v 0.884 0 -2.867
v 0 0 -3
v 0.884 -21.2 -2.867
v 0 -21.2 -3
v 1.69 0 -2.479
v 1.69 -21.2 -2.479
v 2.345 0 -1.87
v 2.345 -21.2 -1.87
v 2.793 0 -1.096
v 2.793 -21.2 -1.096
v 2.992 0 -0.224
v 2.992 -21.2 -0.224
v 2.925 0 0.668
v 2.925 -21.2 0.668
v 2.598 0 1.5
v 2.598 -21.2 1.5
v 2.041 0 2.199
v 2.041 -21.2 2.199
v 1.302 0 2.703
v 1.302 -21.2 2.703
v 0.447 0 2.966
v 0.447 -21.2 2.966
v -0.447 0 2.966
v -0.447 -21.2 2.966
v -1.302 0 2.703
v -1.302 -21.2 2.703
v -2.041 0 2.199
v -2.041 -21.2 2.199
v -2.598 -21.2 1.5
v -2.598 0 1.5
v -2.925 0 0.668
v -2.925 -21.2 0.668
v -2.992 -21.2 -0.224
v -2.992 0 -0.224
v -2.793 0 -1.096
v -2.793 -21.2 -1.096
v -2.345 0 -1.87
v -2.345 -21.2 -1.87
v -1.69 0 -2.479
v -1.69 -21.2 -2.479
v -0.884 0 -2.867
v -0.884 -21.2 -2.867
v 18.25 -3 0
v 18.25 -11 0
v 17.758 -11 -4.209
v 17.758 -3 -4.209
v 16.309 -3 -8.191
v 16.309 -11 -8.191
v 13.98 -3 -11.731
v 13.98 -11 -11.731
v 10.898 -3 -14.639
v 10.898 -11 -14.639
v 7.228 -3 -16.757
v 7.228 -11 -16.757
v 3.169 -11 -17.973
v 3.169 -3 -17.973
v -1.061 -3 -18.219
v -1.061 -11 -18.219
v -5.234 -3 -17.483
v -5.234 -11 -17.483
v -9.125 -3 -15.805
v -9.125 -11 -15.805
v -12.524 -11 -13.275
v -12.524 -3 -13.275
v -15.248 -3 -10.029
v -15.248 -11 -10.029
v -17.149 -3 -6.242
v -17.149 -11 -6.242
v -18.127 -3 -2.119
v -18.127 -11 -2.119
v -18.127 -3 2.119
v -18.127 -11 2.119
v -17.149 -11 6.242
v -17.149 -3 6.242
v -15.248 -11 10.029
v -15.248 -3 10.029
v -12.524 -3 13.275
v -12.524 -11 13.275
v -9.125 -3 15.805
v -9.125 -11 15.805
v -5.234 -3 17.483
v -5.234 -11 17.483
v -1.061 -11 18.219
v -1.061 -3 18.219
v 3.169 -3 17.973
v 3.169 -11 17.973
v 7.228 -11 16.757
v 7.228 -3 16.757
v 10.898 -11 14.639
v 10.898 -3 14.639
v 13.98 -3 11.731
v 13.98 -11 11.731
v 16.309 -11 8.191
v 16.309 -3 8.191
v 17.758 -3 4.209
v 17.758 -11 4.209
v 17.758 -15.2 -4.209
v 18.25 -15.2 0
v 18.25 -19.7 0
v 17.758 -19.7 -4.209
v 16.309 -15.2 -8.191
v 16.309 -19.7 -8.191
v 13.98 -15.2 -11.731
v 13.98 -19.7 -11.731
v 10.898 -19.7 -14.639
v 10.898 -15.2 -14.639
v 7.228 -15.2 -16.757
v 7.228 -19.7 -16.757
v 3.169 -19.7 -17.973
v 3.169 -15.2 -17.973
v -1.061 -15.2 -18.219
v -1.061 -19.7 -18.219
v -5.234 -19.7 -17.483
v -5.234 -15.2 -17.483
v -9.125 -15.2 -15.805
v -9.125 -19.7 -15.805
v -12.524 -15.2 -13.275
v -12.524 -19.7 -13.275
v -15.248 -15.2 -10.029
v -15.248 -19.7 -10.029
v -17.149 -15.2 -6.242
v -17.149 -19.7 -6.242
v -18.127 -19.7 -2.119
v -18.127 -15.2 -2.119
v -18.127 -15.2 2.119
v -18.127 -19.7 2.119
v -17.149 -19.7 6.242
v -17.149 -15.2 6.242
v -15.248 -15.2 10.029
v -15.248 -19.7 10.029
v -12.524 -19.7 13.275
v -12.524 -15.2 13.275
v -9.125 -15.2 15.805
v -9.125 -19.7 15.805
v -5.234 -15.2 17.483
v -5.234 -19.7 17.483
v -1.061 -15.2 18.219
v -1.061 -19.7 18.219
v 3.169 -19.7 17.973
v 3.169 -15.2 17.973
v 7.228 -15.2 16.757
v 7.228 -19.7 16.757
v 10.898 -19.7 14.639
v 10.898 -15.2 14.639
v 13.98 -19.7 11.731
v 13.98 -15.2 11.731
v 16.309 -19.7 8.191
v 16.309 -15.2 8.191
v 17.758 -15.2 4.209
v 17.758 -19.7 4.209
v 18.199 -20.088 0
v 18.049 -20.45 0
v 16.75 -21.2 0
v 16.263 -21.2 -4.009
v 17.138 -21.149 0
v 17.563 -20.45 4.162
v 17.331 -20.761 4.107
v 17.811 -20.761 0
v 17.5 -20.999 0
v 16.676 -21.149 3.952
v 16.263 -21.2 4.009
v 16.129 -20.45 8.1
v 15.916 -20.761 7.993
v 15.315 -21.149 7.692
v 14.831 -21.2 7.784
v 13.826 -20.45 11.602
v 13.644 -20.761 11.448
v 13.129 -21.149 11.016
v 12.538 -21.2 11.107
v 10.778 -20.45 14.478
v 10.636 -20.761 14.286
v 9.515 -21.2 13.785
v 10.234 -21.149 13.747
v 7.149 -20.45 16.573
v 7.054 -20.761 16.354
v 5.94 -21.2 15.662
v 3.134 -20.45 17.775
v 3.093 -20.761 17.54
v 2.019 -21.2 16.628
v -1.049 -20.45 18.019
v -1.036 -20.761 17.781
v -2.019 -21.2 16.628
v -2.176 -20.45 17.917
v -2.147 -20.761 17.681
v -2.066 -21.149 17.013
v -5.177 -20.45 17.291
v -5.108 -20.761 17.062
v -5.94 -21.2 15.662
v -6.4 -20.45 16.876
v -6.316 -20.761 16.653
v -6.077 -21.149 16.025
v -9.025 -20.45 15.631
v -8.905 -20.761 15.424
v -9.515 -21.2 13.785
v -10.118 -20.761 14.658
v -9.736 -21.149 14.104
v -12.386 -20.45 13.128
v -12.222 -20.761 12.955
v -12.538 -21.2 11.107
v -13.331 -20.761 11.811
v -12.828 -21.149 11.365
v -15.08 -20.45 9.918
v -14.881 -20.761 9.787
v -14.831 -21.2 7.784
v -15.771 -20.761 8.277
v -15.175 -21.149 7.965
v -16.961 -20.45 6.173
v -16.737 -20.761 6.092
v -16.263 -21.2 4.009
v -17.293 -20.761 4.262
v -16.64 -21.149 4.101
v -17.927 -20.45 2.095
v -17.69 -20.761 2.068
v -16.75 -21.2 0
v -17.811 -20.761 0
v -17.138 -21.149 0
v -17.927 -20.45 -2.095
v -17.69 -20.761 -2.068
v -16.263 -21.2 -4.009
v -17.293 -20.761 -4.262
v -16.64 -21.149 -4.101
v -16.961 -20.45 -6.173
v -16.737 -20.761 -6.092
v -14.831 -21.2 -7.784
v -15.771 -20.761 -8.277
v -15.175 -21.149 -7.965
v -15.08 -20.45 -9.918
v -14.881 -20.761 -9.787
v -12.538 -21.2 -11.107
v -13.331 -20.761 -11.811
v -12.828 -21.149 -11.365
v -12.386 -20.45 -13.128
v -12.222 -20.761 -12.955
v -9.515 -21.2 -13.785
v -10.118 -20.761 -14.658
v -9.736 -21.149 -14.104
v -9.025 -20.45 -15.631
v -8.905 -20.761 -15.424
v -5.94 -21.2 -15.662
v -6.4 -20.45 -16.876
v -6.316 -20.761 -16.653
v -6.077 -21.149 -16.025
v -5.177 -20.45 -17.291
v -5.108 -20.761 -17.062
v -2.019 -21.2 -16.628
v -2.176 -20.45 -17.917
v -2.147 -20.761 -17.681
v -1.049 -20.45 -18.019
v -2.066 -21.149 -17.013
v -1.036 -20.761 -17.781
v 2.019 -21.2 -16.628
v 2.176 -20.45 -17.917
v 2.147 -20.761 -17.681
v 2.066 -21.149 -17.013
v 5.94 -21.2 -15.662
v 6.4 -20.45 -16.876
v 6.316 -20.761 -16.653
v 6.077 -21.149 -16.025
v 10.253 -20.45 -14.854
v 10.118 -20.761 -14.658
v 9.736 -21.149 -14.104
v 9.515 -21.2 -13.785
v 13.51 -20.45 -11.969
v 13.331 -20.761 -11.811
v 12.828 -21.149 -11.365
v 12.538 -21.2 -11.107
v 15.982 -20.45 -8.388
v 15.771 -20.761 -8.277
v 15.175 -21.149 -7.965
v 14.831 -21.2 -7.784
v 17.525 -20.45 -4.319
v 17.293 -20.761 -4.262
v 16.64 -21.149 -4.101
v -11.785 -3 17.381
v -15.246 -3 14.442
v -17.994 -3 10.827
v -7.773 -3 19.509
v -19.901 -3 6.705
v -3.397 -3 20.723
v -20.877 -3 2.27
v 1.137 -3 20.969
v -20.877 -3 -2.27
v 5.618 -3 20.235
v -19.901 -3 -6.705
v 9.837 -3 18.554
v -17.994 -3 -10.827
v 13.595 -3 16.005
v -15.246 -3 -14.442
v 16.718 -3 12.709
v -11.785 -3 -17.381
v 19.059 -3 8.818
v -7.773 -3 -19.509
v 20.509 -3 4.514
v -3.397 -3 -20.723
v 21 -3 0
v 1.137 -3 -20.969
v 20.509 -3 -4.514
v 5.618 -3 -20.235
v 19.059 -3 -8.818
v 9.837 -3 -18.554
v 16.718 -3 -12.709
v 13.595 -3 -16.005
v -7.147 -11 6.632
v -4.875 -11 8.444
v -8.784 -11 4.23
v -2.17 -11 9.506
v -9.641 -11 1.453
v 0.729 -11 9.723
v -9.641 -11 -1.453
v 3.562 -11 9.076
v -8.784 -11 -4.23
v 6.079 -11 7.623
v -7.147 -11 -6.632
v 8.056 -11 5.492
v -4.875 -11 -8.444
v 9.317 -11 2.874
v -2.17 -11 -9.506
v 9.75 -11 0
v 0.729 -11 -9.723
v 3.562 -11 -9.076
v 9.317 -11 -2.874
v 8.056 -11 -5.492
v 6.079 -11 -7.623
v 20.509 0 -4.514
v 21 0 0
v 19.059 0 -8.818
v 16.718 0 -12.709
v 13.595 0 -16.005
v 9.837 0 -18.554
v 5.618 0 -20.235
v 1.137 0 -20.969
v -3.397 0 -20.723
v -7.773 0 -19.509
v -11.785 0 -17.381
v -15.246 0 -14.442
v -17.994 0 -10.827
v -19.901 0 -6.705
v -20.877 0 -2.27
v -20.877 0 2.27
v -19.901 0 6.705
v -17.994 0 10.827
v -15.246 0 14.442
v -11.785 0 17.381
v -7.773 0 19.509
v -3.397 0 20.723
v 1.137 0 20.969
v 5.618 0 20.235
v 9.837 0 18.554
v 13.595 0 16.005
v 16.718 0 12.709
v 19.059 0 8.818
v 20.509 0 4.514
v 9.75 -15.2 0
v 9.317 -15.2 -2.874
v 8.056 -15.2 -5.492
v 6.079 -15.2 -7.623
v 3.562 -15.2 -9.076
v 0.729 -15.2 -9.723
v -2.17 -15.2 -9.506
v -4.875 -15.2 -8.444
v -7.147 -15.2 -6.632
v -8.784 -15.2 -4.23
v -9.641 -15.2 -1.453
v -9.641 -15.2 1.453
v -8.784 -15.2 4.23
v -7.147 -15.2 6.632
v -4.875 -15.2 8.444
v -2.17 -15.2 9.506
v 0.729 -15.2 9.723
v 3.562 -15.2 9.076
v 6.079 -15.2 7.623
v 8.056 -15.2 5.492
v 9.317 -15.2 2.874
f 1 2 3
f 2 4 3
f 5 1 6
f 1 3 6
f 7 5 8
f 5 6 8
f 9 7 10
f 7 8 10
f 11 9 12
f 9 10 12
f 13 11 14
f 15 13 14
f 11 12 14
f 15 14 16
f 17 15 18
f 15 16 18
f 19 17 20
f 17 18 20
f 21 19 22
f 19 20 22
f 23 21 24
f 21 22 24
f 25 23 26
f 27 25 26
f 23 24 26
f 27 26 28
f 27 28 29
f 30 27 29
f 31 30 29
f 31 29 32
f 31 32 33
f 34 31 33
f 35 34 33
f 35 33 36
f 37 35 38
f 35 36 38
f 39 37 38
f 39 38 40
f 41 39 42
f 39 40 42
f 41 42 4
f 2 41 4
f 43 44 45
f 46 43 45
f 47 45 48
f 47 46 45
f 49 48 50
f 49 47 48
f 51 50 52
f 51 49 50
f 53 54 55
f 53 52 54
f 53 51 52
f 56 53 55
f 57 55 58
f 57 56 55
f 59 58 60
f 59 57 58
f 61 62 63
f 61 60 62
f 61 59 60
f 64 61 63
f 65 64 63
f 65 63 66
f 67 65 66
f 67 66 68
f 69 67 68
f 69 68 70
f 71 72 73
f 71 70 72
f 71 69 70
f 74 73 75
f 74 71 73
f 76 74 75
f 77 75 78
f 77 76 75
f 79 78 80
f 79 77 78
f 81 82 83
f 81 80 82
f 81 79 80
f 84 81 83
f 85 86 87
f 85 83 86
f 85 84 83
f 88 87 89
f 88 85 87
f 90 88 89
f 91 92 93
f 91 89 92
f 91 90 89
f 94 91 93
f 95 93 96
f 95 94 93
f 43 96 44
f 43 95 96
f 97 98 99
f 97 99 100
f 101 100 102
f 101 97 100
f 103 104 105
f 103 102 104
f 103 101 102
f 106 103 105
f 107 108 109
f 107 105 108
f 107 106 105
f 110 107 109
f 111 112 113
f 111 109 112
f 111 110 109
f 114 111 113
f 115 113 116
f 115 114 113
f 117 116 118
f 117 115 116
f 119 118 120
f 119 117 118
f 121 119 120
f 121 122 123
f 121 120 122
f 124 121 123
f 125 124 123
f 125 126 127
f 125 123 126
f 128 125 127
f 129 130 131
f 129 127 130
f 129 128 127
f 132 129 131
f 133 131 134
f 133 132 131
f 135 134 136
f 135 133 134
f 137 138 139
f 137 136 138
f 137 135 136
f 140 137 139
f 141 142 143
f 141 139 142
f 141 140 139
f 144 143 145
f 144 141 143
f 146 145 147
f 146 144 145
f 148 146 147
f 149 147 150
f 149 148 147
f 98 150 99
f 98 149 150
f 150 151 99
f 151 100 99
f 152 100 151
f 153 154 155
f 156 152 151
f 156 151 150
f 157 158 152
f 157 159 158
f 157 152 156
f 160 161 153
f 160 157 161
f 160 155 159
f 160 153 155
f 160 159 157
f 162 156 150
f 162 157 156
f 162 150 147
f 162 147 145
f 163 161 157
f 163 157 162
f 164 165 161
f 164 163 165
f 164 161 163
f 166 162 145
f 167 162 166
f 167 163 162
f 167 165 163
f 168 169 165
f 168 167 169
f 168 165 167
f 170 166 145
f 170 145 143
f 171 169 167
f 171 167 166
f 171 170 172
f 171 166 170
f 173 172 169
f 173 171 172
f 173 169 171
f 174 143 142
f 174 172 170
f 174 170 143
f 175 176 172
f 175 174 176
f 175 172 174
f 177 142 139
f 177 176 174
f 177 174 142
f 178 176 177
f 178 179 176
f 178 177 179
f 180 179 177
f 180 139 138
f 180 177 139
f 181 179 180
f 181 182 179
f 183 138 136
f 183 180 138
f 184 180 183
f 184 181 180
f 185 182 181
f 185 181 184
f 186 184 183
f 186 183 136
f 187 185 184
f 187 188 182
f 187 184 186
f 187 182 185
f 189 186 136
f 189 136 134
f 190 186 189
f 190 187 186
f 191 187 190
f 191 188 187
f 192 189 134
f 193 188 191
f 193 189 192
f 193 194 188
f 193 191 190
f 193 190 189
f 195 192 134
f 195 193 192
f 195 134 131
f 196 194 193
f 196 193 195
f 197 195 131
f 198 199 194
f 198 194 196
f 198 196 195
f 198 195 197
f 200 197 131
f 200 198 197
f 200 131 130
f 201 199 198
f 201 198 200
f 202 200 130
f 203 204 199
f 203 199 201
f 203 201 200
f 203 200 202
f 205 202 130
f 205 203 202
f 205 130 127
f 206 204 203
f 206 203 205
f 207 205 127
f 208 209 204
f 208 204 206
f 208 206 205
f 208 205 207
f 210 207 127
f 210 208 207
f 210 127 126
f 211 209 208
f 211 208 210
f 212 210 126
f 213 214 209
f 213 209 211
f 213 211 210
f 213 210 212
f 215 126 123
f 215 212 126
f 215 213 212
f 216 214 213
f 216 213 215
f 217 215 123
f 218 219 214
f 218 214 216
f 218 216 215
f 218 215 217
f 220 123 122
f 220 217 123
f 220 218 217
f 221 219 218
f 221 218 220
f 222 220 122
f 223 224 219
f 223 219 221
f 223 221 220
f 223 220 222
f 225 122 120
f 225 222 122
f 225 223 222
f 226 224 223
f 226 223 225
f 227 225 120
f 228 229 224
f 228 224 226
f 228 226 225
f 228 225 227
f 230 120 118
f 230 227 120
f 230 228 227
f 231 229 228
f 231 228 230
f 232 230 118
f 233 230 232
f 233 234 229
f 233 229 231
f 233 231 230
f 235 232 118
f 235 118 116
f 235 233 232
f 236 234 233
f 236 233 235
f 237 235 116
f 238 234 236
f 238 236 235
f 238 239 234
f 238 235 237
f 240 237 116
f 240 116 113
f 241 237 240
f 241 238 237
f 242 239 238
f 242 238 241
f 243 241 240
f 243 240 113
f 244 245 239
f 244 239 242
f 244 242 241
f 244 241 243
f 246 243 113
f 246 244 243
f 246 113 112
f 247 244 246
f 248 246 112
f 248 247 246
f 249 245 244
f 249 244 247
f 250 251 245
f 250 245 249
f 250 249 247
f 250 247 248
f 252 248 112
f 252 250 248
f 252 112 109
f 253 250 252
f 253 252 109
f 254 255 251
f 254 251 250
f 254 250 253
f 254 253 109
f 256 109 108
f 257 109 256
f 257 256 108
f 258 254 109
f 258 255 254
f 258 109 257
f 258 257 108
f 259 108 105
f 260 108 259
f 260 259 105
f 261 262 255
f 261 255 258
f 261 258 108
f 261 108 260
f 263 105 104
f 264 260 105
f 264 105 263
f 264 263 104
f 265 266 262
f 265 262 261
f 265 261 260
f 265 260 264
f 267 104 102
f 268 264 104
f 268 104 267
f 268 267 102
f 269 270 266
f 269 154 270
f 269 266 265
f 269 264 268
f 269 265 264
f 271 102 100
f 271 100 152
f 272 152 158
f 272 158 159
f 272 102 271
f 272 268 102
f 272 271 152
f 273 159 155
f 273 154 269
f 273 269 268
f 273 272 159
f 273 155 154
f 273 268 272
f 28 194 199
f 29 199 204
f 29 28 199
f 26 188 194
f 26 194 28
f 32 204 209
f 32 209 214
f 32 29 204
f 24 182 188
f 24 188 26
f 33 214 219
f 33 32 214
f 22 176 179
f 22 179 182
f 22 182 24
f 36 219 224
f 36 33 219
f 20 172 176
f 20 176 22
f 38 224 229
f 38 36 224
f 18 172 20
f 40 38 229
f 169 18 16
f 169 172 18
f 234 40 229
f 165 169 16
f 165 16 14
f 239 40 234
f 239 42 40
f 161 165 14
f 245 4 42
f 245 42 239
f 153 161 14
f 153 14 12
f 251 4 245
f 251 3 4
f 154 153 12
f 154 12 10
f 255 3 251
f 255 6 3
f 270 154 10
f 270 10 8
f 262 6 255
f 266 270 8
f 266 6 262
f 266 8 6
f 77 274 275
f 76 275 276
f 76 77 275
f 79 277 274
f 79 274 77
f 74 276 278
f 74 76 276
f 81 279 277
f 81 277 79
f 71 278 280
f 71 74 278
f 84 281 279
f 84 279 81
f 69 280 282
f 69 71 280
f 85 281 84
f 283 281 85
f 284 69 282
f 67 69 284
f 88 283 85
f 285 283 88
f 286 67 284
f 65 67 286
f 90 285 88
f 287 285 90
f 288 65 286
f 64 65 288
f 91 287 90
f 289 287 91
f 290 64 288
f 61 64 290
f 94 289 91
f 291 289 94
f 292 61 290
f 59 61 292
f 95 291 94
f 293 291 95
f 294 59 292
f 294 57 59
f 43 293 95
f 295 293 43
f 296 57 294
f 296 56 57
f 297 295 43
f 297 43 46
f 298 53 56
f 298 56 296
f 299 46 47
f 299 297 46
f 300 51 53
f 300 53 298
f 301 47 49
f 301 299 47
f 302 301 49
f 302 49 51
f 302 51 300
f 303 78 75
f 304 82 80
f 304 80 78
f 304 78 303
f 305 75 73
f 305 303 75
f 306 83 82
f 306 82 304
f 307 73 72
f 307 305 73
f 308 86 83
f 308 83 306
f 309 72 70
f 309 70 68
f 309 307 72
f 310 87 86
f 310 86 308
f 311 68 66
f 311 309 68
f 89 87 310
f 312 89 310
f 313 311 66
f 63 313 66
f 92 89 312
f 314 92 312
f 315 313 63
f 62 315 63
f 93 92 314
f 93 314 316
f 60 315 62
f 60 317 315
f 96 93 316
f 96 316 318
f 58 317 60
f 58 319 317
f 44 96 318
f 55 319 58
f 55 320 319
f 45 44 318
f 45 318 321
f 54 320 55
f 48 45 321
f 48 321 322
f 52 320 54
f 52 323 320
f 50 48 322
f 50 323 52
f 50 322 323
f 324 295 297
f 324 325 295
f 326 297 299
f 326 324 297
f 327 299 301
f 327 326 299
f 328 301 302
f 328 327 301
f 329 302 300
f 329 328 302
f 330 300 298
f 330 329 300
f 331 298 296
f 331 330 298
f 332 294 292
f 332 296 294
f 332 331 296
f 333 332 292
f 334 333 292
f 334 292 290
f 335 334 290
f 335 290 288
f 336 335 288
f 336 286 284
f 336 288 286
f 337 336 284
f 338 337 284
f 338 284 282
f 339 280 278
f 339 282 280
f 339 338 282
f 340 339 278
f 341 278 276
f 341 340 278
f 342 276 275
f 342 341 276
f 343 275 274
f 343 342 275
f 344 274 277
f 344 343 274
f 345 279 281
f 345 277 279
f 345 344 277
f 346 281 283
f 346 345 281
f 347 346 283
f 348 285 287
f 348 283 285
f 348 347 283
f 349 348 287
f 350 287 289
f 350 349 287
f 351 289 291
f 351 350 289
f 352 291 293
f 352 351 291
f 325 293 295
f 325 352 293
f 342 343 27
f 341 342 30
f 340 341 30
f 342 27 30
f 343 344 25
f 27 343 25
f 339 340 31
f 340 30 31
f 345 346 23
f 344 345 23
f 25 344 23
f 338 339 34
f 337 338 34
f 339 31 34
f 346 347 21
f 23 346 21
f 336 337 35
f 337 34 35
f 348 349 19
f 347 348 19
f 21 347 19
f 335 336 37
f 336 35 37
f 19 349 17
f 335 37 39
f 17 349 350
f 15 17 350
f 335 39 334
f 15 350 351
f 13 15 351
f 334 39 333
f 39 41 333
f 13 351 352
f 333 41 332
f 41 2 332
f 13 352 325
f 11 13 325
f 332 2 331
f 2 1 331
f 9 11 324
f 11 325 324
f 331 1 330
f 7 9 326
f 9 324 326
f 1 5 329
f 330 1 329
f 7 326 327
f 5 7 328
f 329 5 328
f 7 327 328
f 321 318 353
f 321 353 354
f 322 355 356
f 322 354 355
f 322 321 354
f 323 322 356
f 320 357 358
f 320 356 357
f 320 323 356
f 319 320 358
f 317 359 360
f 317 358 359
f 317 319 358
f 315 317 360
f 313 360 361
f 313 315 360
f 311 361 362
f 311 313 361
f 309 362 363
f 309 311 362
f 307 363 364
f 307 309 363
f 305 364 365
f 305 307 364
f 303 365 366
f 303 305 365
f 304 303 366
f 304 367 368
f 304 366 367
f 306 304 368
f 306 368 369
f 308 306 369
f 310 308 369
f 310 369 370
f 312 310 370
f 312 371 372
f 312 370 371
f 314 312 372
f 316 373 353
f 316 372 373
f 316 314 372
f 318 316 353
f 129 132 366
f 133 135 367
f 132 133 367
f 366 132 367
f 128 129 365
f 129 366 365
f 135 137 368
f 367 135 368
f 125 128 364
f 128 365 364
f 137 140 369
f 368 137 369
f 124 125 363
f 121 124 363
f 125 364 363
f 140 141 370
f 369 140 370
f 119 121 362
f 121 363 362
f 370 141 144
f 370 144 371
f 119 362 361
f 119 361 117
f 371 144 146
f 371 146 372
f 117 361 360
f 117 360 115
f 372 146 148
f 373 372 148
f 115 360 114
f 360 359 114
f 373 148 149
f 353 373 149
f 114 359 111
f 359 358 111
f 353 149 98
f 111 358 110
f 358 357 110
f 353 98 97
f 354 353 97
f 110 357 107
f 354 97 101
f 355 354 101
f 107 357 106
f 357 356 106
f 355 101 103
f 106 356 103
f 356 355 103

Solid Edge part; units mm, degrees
sketch "Sketch1" plane through (0, 0, 0) normal (0, -1, 0) x (1, 0, 0)
  circle A0 centre (0, 0) radius 21
extrude "Extrusionsausprägung_1" add sketch "Sketch1" along normal blind 3
sketch "Sketch2" plane through (0, -3, 0) normal (0, -1, 0) x (1, 0, 0)
  circle A0 centre (0, 0) radius 18.25
extrude "Extrusionsausprägung_2" add sketch "Sketch2" along normal blind 8
sketch "Sketch3" plane through (0, -11, 0) normal (0, -1, 0) x (1, 0, 0)
  circle A0 centre (0, 0) radius 9.75
extrude "Extrusionsausprägung_3" add sketch "Sketch3" along normal blind 4.2
sketch "Sketch4" plane through (0, -15.2, 0) normal (0, -1, 0) x (1, 0, 0)
  circle A0 centre (0, 0) radius 18.25
extrude "Extrusionsausprägung_4" add sketch "Sketch4" along normal blind 6
fillet "Verrundung_1" radius 1.5 1 edges at (-18.25, -21.2, 0)
hole "Bohrung_1" at (0, -21.2, 0) direction (0, 1, 0) diameter 6 end through all
properties material "ABS-Plastik, mittlerer Anschlag"
